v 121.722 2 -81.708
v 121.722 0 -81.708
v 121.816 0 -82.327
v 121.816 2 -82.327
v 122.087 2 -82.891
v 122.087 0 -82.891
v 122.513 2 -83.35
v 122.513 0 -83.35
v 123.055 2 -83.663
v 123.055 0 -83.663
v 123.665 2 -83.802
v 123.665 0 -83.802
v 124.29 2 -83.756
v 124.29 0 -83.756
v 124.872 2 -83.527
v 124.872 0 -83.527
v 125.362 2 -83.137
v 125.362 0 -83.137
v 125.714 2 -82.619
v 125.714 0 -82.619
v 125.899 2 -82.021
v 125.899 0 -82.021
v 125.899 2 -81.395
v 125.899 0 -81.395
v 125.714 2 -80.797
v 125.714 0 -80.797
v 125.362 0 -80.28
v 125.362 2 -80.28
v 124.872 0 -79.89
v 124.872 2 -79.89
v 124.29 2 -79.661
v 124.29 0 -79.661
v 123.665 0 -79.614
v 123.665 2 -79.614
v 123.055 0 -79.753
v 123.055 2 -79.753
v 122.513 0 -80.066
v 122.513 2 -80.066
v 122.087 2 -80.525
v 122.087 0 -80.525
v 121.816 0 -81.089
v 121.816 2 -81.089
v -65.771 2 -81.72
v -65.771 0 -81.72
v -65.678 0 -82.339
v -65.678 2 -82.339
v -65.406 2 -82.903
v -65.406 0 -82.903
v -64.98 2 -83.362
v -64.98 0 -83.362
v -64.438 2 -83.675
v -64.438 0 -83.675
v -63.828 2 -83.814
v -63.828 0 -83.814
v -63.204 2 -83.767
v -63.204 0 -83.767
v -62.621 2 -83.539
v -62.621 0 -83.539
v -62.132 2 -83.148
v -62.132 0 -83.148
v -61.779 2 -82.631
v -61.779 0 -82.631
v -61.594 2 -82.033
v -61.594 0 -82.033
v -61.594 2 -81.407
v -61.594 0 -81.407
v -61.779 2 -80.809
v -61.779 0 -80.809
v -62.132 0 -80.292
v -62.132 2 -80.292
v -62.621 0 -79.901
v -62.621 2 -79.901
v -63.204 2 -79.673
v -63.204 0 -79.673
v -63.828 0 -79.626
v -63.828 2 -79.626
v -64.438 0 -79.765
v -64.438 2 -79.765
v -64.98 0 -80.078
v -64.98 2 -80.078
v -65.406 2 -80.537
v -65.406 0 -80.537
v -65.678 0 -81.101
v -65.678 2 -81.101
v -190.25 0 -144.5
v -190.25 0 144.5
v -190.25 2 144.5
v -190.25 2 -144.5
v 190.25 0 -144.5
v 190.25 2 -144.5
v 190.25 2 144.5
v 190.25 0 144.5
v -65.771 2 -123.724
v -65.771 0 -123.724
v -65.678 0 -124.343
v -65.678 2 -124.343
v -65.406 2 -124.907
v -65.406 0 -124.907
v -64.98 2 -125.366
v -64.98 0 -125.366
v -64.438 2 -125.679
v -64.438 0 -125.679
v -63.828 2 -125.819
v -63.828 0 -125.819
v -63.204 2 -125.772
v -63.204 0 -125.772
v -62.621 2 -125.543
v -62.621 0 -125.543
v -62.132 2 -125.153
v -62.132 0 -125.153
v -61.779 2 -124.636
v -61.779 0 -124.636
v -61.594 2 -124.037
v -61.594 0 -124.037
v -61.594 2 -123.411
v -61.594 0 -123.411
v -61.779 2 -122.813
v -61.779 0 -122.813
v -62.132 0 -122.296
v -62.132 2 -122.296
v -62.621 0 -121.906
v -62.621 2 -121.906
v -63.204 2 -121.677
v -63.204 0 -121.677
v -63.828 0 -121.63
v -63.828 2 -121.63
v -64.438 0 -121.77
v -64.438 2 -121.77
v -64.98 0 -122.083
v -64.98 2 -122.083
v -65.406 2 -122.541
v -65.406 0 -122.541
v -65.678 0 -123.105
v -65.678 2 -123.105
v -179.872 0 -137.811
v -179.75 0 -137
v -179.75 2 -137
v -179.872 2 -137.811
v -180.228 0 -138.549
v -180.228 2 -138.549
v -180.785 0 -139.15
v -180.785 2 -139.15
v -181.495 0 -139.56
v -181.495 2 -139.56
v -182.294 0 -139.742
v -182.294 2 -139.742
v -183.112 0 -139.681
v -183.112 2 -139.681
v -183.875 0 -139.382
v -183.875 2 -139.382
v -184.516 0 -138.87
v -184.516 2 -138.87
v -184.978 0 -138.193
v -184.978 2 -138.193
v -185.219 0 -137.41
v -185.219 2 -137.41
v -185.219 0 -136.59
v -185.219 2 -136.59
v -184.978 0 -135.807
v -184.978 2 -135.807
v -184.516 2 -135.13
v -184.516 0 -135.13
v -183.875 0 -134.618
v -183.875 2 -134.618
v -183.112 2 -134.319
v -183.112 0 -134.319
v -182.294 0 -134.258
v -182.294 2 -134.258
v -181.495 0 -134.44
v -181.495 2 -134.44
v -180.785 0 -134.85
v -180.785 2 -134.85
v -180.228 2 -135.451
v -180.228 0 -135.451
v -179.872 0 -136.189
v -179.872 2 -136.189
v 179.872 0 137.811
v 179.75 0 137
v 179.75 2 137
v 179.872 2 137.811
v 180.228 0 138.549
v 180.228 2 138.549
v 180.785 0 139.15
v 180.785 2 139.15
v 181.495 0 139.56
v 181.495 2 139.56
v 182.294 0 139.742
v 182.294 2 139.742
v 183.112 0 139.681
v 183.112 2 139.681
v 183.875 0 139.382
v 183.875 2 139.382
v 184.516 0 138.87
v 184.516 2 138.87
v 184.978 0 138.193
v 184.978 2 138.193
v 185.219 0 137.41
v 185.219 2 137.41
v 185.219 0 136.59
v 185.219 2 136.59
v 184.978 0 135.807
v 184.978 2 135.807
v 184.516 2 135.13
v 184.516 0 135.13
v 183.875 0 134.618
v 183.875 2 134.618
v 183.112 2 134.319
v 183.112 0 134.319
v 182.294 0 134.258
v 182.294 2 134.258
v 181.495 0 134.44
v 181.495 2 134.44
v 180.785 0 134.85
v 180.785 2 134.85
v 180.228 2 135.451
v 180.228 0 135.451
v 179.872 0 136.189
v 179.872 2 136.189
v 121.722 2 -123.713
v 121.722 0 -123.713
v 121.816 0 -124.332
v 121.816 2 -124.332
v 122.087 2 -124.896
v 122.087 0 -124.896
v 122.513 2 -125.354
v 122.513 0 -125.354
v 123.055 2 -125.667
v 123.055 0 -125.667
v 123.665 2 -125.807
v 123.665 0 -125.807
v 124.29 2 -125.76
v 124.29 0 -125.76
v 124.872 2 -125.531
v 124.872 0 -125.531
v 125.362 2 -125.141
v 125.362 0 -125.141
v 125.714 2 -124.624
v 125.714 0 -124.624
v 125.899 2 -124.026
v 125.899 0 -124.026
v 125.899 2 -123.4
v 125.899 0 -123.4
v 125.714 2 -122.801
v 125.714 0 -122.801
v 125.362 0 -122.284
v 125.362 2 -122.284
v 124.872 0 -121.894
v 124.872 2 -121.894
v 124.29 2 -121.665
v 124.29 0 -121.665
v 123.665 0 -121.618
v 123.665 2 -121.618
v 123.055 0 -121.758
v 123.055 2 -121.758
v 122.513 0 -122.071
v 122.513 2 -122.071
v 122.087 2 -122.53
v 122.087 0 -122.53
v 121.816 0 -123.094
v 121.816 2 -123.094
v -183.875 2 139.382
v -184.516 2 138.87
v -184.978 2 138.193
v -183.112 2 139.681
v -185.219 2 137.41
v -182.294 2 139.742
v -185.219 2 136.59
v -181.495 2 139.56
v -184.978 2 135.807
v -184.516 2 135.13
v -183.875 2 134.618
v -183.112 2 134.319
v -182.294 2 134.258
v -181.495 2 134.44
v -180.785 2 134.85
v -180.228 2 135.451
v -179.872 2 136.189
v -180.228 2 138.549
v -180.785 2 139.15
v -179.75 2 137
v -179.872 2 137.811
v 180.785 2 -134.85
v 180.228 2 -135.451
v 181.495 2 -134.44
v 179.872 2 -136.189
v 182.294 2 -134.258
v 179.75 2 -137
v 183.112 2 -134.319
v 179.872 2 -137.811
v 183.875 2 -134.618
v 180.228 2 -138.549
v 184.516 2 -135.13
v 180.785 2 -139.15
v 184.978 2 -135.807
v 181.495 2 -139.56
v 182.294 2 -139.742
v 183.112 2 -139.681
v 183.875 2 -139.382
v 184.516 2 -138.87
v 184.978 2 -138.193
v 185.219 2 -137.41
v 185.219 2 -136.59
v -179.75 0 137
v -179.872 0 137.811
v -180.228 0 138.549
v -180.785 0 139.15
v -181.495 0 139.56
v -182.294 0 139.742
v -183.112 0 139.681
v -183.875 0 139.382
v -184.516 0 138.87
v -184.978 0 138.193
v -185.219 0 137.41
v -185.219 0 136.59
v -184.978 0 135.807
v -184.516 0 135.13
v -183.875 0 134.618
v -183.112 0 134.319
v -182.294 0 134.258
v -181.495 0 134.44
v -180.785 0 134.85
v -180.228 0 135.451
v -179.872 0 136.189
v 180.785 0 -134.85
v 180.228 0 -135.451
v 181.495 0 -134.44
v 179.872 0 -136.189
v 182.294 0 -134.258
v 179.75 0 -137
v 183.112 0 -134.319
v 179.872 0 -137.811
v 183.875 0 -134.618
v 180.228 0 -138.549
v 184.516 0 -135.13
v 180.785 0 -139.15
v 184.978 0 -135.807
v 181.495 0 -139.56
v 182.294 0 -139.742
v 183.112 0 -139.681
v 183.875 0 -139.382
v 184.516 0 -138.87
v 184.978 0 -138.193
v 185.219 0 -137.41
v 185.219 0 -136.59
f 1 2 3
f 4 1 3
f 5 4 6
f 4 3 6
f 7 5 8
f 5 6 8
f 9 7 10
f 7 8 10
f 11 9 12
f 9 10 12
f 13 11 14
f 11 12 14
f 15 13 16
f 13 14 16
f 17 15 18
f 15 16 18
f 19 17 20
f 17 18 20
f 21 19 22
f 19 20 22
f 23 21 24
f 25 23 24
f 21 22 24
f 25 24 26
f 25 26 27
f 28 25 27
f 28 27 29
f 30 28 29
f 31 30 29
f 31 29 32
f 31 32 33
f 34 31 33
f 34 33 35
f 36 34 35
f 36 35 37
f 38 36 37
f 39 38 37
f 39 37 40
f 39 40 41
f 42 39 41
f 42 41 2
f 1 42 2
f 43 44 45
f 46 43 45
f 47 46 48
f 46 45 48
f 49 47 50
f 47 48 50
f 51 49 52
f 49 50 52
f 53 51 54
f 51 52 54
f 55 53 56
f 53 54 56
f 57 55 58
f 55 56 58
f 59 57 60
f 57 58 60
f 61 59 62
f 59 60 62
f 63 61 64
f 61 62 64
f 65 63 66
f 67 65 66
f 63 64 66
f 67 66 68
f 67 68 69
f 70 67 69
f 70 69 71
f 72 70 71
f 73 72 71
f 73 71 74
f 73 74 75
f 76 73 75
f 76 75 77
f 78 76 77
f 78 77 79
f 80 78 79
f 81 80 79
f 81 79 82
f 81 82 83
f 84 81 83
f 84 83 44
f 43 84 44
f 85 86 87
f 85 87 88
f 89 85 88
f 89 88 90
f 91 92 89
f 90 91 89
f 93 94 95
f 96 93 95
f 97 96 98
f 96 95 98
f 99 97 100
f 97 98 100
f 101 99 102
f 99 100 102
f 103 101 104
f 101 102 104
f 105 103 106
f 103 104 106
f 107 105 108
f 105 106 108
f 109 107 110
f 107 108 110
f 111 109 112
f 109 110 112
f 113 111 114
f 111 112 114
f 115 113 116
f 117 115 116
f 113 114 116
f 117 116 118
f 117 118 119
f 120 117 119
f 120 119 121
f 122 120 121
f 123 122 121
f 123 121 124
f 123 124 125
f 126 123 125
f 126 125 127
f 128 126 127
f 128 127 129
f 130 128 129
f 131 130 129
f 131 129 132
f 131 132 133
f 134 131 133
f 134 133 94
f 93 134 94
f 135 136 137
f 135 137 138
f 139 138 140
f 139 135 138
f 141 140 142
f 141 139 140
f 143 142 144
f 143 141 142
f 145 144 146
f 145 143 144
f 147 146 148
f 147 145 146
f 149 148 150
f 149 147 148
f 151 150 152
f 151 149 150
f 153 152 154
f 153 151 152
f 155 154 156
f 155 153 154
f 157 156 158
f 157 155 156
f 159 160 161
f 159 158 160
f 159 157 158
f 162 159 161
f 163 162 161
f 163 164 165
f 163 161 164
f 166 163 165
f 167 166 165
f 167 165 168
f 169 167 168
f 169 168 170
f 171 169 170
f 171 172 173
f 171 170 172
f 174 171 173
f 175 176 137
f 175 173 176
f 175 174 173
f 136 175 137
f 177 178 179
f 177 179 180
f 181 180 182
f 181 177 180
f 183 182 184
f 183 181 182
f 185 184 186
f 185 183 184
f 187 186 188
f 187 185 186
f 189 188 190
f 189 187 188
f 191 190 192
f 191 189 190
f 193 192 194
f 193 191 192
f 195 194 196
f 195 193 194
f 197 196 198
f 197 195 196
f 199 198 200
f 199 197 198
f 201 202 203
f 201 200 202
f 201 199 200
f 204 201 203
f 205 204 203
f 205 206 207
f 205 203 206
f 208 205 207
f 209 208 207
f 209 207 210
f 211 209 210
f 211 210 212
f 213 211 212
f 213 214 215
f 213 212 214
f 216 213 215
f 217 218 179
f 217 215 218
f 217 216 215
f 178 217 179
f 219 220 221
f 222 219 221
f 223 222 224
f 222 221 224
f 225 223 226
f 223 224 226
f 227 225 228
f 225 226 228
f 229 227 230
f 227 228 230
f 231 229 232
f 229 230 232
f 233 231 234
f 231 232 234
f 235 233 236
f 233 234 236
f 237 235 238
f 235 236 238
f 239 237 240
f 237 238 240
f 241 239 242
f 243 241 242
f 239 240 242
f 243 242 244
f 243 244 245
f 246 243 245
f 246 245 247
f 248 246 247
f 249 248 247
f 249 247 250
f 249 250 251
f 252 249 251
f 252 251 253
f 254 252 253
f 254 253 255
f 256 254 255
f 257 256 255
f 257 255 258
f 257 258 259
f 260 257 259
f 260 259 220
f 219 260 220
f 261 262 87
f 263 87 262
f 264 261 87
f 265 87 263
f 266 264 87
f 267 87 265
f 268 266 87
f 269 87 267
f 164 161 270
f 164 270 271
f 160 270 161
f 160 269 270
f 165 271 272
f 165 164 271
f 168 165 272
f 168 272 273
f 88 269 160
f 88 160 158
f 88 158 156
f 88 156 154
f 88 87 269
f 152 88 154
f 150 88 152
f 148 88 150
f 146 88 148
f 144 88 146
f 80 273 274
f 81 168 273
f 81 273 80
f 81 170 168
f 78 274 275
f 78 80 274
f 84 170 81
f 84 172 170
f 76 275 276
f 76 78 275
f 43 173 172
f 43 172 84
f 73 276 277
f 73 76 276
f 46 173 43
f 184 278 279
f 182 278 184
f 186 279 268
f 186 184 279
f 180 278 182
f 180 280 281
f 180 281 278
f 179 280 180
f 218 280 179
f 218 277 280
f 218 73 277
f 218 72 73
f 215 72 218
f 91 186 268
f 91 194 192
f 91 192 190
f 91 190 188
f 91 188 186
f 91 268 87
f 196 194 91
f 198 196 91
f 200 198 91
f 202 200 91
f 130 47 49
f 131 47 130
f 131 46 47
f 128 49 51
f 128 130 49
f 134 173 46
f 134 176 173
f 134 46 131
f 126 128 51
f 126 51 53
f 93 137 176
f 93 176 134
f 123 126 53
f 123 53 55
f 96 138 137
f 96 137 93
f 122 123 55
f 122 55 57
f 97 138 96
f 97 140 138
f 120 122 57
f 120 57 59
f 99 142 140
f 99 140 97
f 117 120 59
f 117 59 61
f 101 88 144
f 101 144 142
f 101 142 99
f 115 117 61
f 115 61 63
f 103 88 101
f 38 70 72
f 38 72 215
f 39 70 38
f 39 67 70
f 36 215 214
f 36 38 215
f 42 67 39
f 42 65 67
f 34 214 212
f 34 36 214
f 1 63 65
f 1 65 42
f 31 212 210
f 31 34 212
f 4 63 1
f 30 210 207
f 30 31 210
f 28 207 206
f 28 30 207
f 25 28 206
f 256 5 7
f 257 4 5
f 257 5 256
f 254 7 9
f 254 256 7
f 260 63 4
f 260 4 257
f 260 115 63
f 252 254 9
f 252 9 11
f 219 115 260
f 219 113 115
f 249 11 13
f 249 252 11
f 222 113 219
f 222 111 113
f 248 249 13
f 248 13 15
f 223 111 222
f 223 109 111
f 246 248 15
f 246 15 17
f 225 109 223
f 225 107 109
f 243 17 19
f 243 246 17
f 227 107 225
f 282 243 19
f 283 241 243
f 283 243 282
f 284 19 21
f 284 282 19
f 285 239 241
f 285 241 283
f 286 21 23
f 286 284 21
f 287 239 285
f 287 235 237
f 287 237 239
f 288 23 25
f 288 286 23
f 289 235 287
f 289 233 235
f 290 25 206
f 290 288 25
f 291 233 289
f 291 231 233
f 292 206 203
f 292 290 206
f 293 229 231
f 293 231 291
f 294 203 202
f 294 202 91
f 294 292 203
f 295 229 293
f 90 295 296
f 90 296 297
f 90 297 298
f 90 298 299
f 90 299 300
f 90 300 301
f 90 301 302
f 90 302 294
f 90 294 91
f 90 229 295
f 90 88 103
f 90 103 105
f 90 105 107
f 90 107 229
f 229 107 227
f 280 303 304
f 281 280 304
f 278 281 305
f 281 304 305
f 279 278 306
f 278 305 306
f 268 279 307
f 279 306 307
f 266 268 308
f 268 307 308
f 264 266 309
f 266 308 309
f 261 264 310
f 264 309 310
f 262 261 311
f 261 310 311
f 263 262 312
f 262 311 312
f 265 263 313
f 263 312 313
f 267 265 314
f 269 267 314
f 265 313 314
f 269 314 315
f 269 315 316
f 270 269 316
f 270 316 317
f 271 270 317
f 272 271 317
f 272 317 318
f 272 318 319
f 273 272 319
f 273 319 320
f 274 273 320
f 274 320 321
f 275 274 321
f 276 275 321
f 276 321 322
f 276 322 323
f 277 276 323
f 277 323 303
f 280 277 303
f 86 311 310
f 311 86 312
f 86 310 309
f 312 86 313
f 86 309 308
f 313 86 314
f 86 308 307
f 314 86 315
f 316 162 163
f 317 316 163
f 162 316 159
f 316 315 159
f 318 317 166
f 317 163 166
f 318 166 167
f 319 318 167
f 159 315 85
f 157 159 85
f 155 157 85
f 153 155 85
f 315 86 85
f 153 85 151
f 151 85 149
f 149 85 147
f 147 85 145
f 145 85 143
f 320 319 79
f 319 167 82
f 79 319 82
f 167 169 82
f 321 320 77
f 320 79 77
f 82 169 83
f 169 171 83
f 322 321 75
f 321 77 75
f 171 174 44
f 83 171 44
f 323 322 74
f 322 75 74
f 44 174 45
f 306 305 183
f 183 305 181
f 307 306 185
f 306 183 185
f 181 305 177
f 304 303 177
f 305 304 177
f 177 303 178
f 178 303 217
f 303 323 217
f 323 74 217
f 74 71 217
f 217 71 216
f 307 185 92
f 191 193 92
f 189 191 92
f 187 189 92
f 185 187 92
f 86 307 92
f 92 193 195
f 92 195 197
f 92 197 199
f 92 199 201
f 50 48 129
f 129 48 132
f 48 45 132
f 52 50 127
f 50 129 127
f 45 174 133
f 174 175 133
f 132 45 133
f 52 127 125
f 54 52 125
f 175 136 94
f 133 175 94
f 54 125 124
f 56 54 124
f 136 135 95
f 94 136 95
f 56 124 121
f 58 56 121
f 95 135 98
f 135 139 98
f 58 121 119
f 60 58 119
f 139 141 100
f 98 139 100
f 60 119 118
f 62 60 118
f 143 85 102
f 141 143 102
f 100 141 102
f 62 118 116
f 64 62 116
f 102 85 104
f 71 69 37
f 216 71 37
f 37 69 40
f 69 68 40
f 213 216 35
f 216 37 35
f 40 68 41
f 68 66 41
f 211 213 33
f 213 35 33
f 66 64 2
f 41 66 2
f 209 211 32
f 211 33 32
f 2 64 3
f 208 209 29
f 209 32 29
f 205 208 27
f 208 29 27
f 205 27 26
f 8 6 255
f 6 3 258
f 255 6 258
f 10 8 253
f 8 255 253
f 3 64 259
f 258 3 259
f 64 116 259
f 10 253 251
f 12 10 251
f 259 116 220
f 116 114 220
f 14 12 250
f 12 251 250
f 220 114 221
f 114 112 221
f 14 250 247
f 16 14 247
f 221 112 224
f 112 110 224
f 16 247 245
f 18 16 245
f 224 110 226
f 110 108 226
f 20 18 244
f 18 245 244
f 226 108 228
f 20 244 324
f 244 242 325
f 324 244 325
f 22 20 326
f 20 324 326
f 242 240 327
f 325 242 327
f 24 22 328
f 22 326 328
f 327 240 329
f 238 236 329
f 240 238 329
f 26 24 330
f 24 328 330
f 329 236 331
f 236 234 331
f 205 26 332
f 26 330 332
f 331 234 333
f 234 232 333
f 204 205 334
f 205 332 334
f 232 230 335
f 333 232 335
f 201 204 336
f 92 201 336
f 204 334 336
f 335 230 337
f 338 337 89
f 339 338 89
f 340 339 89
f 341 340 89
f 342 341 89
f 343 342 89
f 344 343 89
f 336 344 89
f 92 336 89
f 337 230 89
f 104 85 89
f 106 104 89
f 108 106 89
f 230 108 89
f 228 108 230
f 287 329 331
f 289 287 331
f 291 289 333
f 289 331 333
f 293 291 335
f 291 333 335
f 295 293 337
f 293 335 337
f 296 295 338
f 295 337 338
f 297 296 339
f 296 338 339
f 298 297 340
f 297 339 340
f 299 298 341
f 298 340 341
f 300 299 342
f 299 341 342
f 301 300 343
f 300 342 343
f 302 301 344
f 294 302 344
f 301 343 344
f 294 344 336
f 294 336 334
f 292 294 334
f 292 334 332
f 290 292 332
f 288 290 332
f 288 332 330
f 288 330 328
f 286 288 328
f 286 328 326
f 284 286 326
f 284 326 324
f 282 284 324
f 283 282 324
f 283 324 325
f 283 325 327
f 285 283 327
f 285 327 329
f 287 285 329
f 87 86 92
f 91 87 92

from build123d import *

# Parameters (mm, degrees)
SKETCH9_W                  = 380.5
SKETCH9_H                  = 289
BOSS_EXTRUDE2_DEPTH        = 2
M5_CLEARANCE_HOLE1_D       = 5.5
MIRROR2_COPY_1_D           = 5.5
F_4_2_4_2_DIAMETER_HOLE1_D = 4.2


with BuildPart() as part:
    # Sketch9 → Boss-Extrude2 (new body)
    with BuildSketch(Plane(origin=(0, 0, 0), x_dir=(1, 0, 0), z_dir=(0, 1, 0))):
        Rectangle(SKETCH9_W, SKETCH9_H)
    extrude(amount=BOSS_EXTRUDE2_DEPTH)

    # M5 Clearance Hole1 (through all)
    with Locations(Plane(origin=(0, 2, 0), x_dir=(1, 0, 0), z_dir=(0, 1, 0))):
        with Locations((182.5, 137)):
            m5_clearance_hole1 = Hole(M5_CLEARANCE_HOLE1_D / 2)

    # Mirror1: M5 Clearance Hole1 across plane
    add(m5_clearance_hole1.mirror(Plane.XY), mode=Mode.SUBTRACT)

    # Mirror2: M5 Clearance Hole1 across plane
    add(m5_clearance_hole1.mirror(Plane(origin=(0, 0, 0), x_dir=(0, 0, 1), z_dir=(1, 0, 0))), mode=Mode.SUBTRACT)

    # Mirror2 copy 1 (through all)
    with Locations(Plane(origin=(0, 2, 0), x_dir=(-1, 0, 0), z_dir=(0, 1, 0))):
        with Locations((182.5, 137)):
            Hole(MIRROR2_COPY_1_D / 2)

    # Ø4.2 (4.2) Diameter Hole1 (through all)
    with Locations(Plane(origin=(0, 2, 0), x_dir=(1, 0, 0), z_dir=(0, 1, 0))):
        with Locations((-63.670911712, 123.724418587), (-63.670911465, 81.719974794), (123.822278547, 81.708178414), (123.8222783, 123.712622207)):
            Hole(F_4_2_4_2_DIAMETER_HOLE1_D / 2)


solid = part.part
